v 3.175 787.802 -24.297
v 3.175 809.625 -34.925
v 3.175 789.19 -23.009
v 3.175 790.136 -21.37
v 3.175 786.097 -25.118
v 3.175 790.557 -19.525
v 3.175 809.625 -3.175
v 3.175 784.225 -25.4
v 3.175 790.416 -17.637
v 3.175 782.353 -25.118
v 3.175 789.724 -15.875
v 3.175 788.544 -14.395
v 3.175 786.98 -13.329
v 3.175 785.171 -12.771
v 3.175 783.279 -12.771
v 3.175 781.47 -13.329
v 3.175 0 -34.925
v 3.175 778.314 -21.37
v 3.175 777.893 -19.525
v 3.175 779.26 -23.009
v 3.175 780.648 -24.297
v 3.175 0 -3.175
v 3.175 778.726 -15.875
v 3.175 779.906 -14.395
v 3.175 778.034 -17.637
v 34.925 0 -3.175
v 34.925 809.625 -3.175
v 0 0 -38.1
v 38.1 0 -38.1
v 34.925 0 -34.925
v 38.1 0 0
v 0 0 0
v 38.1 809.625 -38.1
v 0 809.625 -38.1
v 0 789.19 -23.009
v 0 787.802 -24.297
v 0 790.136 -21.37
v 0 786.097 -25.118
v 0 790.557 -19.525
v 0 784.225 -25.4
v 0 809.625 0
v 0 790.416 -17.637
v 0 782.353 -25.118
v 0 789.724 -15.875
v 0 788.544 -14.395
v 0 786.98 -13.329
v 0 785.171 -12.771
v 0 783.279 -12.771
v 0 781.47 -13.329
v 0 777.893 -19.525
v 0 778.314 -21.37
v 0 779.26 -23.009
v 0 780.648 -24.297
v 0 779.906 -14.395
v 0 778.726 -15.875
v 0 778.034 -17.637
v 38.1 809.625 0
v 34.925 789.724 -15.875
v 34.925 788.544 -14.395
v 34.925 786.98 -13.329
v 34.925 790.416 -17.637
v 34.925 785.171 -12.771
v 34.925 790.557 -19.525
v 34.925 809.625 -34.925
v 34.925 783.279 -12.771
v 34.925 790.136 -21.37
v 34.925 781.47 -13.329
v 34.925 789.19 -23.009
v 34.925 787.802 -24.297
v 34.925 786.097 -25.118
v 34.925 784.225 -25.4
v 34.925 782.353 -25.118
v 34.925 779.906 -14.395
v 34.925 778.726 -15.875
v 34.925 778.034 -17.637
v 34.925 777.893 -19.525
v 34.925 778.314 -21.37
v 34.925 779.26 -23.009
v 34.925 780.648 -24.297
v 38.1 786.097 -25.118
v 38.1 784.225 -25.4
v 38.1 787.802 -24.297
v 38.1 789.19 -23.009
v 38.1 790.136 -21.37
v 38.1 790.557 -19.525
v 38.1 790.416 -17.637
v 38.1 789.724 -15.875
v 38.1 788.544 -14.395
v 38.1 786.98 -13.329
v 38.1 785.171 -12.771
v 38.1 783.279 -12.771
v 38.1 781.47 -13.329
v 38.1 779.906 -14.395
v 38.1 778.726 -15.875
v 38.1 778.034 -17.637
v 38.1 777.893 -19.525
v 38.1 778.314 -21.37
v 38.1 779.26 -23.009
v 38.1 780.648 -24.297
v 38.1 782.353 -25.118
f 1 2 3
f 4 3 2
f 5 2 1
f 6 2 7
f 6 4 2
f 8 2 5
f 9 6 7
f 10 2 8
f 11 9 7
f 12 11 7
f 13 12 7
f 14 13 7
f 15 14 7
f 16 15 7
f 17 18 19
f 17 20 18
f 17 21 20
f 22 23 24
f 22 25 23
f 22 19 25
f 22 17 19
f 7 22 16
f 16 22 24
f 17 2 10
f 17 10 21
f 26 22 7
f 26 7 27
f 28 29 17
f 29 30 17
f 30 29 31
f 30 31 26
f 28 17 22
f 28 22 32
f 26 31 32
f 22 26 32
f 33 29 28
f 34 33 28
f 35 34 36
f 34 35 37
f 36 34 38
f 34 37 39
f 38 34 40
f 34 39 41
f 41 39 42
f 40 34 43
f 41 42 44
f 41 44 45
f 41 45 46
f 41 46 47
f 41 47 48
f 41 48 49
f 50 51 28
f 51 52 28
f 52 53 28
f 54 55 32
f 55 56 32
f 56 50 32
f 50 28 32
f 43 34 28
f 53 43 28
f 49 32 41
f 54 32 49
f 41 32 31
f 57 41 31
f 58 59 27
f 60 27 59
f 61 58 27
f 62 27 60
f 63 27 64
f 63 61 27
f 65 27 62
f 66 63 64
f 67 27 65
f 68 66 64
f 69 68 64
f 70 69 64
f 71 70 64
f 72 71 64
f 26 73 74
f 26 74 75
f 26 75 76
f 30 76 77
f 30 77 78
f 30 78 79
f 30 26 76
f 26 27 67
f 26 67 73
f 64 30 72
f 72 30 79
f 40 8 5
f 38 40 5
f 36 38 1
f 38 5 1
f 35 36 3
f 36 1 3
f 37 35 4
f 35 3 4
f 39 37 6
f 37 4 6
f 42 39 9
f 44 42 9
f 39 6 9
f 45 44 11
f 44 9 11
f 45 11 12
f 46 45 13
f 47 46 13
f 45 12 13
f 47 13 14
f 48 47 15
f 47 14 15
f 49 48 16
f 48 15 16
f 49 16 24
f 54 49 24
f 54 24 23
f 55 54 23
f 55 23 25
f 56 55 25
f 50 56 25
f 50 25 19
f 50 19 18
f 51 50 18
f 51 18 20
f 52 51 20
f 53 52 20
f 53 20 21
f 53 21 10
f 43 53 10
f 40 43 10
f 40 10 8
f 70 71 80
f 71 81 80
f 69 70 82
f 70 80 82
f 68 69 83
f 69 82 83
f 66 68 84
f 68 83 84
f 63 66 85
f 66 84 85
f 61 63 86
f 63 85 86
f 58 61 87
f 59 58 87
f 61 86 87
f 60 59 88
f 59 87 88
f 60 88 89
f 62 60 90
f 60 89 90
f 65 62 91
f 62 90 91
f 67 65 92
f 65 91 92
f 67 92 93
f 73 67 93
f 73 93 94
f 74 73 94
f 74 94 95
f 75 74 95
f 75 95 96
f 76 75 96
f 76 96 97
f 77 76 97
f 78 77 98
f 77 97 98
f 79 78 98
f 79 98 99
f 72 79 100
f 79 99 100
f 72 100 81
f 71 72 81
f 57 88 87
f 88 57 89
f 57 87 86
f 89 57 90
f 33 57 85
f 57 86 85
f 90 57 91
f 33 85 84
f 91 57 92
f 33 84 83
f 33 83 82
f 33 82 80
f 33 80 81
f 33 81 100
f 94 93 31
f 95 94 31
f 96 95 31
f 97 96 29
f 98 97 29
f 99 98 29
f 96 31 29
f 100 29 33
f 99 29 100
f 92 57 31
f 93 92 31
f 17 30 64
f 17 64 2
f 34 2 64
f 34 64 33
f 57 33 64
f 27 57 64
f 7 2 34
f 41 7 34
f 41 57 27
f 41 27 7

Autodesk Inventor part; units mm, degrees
ref_plane "YZ Plane" through (0, 0, 0) normal (1, 0, 0) x (0, 1, 0)
ref_plane "XZ Plane" through (0, 0, 0) normal (0, 1, 0) x (-1, 0, 0)
ref_plane "XY Plane" through (0, 0, 0) normal (0, 0, 1) x (1, 0, 0)
sketch "Sketch1" plane through (0, 0, 0) normal (0, 1, 0) x (-1, 0, 0)
  line L0 (0, 0) -> (-38.1, 0)
  line L1 (-38.1, 0) -> (-38.1, -38.1)
  line L2 (-38.1, -38.1) -> (0, -38.1)
  line L3 (0, -38.1) -> (0, 0)
  line L4 (-3.175, -3.175) -> (-34.925, -3.175)
  line L5 (-34.925, -3.175) -> (-34.925, -34.925)
  line L6 (-34.925, -34.925) -> (-3.175, -34.925)
  line L7 (-3.175, -34.925) -> (-3.175, -3.175)
  dimension "d0" = 38.1
  dimension "d1" = 38.1
  dimension "d2" = 3.175
extrude "Extrusion1" add sketch "Sketch1" along normal blind 809.625
sketch "Sketch2" plane through (38.1, 0, 0) normal (1, 0, 0) x (0, 0, -1)
  circle A0 centre (19.05, 784.225) radius 6.35
  line L0 (0, 809.625) -> (38.1, 809.625) projected
  point P0 (0, 0)
  dimension "d5" = 12.7
  dimension "d6" = 25.4
extrude "Extrusion2" cut sketch "Sketch2" against normal through all
properties part number "Pivot point Support"
